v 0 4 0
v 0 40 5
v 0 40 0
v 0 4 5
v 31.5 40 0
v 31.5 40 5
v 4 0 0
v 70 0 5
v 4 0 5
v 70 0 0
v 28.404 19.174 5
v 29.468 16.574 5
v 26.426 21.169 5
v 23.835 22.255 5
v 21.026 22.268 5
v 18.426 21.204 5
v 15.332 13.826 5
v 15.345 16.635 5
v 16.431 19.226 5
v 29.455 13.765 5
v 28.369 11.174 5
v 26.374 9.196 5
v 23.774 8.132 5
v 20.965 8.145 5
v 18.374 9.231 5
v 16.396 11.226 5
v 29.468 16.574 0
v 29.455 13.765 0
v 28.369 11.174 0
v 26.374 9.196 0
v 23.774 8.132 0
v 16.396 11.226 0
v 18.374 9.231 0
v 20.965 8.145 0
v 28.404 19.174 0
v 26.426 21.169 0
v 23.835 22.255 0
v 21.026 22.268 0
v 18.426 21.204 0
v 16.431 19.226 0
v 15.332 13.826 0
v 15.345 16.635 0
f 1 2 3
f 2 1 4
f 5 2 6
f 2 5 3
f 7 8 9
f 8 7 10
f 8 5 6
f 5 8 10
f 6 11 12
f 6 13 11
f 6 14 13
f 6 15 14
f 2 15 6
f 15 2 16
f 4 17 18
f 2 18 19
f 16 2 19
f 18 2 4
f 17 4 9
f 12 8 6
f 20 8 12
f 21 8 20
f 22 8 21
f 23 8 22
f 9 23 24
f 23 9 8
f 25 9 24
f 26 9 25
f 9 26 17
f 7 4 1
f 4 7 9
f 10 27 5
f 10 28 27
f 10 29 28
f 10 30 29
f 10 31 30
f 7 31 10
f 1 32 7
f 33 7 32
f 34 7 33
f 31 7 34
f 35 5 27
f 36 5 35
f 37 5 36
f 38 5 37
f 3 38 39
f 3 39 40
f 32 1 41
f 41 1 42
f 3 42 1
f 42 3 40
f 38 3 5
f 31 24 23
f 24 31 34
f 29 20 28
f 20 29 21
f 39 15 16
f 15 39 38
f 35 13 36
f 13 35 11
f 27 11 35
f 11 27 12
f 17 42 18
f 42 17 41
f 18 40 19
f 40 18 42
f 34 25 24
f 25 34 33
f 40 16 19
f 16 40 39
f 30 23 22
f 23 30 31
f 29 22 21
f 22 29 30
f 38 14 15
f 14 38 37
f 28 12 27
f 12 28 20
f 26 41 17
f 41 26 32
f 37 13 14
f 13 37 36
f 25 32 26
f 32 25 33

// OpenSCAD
$fn = 32;

// ----------------------------------------------------------------------
// Bracket plate: gusset 70 x 40
// ----------------------------------------------------------------------

// --- parameters (mm) ---
hole_r = 3.5;             // bolt hole radius
plate_t = 5;              // plate thickness, Z (extrusion height)
gus_a = 70;               // base length
gus_b = 40;               // height
top_x = 31.5;             // top edge X of the angled cut
light_r = 7.2;            // lightening hole radius

light_d = 2 * light_r;

profile = [[4, 0], [35, 0], [70, 0], [31.5, 40], [0, 40], [0, 4]];  // primary outline, 6 points, counter clockwise
void_1 = [[29.468, 16.574], [28.404, 19.174], [26.426, 21.169], [23.835, 22.255], [21.026, 22.268], [18.426, 21.204], [16.431, 19.226], [15.345, 16.635], [15.332, 13.826], [16.396, 11.226], [18.374, 9.231], [20.965, 8.145], [23.774, 8.132], [26.374, 9.196], [28.369, 11.174], [29.455, 13.765]];  // lightening hole, 16 points

// --- the one profile operation ---
difference() {
  linear_extrude(height = plate_t) polygon(points = profile);
  translate([0, 0, -1])
    linear_extrude(height = plate_t + 2) polygon(points = void_1);
}
